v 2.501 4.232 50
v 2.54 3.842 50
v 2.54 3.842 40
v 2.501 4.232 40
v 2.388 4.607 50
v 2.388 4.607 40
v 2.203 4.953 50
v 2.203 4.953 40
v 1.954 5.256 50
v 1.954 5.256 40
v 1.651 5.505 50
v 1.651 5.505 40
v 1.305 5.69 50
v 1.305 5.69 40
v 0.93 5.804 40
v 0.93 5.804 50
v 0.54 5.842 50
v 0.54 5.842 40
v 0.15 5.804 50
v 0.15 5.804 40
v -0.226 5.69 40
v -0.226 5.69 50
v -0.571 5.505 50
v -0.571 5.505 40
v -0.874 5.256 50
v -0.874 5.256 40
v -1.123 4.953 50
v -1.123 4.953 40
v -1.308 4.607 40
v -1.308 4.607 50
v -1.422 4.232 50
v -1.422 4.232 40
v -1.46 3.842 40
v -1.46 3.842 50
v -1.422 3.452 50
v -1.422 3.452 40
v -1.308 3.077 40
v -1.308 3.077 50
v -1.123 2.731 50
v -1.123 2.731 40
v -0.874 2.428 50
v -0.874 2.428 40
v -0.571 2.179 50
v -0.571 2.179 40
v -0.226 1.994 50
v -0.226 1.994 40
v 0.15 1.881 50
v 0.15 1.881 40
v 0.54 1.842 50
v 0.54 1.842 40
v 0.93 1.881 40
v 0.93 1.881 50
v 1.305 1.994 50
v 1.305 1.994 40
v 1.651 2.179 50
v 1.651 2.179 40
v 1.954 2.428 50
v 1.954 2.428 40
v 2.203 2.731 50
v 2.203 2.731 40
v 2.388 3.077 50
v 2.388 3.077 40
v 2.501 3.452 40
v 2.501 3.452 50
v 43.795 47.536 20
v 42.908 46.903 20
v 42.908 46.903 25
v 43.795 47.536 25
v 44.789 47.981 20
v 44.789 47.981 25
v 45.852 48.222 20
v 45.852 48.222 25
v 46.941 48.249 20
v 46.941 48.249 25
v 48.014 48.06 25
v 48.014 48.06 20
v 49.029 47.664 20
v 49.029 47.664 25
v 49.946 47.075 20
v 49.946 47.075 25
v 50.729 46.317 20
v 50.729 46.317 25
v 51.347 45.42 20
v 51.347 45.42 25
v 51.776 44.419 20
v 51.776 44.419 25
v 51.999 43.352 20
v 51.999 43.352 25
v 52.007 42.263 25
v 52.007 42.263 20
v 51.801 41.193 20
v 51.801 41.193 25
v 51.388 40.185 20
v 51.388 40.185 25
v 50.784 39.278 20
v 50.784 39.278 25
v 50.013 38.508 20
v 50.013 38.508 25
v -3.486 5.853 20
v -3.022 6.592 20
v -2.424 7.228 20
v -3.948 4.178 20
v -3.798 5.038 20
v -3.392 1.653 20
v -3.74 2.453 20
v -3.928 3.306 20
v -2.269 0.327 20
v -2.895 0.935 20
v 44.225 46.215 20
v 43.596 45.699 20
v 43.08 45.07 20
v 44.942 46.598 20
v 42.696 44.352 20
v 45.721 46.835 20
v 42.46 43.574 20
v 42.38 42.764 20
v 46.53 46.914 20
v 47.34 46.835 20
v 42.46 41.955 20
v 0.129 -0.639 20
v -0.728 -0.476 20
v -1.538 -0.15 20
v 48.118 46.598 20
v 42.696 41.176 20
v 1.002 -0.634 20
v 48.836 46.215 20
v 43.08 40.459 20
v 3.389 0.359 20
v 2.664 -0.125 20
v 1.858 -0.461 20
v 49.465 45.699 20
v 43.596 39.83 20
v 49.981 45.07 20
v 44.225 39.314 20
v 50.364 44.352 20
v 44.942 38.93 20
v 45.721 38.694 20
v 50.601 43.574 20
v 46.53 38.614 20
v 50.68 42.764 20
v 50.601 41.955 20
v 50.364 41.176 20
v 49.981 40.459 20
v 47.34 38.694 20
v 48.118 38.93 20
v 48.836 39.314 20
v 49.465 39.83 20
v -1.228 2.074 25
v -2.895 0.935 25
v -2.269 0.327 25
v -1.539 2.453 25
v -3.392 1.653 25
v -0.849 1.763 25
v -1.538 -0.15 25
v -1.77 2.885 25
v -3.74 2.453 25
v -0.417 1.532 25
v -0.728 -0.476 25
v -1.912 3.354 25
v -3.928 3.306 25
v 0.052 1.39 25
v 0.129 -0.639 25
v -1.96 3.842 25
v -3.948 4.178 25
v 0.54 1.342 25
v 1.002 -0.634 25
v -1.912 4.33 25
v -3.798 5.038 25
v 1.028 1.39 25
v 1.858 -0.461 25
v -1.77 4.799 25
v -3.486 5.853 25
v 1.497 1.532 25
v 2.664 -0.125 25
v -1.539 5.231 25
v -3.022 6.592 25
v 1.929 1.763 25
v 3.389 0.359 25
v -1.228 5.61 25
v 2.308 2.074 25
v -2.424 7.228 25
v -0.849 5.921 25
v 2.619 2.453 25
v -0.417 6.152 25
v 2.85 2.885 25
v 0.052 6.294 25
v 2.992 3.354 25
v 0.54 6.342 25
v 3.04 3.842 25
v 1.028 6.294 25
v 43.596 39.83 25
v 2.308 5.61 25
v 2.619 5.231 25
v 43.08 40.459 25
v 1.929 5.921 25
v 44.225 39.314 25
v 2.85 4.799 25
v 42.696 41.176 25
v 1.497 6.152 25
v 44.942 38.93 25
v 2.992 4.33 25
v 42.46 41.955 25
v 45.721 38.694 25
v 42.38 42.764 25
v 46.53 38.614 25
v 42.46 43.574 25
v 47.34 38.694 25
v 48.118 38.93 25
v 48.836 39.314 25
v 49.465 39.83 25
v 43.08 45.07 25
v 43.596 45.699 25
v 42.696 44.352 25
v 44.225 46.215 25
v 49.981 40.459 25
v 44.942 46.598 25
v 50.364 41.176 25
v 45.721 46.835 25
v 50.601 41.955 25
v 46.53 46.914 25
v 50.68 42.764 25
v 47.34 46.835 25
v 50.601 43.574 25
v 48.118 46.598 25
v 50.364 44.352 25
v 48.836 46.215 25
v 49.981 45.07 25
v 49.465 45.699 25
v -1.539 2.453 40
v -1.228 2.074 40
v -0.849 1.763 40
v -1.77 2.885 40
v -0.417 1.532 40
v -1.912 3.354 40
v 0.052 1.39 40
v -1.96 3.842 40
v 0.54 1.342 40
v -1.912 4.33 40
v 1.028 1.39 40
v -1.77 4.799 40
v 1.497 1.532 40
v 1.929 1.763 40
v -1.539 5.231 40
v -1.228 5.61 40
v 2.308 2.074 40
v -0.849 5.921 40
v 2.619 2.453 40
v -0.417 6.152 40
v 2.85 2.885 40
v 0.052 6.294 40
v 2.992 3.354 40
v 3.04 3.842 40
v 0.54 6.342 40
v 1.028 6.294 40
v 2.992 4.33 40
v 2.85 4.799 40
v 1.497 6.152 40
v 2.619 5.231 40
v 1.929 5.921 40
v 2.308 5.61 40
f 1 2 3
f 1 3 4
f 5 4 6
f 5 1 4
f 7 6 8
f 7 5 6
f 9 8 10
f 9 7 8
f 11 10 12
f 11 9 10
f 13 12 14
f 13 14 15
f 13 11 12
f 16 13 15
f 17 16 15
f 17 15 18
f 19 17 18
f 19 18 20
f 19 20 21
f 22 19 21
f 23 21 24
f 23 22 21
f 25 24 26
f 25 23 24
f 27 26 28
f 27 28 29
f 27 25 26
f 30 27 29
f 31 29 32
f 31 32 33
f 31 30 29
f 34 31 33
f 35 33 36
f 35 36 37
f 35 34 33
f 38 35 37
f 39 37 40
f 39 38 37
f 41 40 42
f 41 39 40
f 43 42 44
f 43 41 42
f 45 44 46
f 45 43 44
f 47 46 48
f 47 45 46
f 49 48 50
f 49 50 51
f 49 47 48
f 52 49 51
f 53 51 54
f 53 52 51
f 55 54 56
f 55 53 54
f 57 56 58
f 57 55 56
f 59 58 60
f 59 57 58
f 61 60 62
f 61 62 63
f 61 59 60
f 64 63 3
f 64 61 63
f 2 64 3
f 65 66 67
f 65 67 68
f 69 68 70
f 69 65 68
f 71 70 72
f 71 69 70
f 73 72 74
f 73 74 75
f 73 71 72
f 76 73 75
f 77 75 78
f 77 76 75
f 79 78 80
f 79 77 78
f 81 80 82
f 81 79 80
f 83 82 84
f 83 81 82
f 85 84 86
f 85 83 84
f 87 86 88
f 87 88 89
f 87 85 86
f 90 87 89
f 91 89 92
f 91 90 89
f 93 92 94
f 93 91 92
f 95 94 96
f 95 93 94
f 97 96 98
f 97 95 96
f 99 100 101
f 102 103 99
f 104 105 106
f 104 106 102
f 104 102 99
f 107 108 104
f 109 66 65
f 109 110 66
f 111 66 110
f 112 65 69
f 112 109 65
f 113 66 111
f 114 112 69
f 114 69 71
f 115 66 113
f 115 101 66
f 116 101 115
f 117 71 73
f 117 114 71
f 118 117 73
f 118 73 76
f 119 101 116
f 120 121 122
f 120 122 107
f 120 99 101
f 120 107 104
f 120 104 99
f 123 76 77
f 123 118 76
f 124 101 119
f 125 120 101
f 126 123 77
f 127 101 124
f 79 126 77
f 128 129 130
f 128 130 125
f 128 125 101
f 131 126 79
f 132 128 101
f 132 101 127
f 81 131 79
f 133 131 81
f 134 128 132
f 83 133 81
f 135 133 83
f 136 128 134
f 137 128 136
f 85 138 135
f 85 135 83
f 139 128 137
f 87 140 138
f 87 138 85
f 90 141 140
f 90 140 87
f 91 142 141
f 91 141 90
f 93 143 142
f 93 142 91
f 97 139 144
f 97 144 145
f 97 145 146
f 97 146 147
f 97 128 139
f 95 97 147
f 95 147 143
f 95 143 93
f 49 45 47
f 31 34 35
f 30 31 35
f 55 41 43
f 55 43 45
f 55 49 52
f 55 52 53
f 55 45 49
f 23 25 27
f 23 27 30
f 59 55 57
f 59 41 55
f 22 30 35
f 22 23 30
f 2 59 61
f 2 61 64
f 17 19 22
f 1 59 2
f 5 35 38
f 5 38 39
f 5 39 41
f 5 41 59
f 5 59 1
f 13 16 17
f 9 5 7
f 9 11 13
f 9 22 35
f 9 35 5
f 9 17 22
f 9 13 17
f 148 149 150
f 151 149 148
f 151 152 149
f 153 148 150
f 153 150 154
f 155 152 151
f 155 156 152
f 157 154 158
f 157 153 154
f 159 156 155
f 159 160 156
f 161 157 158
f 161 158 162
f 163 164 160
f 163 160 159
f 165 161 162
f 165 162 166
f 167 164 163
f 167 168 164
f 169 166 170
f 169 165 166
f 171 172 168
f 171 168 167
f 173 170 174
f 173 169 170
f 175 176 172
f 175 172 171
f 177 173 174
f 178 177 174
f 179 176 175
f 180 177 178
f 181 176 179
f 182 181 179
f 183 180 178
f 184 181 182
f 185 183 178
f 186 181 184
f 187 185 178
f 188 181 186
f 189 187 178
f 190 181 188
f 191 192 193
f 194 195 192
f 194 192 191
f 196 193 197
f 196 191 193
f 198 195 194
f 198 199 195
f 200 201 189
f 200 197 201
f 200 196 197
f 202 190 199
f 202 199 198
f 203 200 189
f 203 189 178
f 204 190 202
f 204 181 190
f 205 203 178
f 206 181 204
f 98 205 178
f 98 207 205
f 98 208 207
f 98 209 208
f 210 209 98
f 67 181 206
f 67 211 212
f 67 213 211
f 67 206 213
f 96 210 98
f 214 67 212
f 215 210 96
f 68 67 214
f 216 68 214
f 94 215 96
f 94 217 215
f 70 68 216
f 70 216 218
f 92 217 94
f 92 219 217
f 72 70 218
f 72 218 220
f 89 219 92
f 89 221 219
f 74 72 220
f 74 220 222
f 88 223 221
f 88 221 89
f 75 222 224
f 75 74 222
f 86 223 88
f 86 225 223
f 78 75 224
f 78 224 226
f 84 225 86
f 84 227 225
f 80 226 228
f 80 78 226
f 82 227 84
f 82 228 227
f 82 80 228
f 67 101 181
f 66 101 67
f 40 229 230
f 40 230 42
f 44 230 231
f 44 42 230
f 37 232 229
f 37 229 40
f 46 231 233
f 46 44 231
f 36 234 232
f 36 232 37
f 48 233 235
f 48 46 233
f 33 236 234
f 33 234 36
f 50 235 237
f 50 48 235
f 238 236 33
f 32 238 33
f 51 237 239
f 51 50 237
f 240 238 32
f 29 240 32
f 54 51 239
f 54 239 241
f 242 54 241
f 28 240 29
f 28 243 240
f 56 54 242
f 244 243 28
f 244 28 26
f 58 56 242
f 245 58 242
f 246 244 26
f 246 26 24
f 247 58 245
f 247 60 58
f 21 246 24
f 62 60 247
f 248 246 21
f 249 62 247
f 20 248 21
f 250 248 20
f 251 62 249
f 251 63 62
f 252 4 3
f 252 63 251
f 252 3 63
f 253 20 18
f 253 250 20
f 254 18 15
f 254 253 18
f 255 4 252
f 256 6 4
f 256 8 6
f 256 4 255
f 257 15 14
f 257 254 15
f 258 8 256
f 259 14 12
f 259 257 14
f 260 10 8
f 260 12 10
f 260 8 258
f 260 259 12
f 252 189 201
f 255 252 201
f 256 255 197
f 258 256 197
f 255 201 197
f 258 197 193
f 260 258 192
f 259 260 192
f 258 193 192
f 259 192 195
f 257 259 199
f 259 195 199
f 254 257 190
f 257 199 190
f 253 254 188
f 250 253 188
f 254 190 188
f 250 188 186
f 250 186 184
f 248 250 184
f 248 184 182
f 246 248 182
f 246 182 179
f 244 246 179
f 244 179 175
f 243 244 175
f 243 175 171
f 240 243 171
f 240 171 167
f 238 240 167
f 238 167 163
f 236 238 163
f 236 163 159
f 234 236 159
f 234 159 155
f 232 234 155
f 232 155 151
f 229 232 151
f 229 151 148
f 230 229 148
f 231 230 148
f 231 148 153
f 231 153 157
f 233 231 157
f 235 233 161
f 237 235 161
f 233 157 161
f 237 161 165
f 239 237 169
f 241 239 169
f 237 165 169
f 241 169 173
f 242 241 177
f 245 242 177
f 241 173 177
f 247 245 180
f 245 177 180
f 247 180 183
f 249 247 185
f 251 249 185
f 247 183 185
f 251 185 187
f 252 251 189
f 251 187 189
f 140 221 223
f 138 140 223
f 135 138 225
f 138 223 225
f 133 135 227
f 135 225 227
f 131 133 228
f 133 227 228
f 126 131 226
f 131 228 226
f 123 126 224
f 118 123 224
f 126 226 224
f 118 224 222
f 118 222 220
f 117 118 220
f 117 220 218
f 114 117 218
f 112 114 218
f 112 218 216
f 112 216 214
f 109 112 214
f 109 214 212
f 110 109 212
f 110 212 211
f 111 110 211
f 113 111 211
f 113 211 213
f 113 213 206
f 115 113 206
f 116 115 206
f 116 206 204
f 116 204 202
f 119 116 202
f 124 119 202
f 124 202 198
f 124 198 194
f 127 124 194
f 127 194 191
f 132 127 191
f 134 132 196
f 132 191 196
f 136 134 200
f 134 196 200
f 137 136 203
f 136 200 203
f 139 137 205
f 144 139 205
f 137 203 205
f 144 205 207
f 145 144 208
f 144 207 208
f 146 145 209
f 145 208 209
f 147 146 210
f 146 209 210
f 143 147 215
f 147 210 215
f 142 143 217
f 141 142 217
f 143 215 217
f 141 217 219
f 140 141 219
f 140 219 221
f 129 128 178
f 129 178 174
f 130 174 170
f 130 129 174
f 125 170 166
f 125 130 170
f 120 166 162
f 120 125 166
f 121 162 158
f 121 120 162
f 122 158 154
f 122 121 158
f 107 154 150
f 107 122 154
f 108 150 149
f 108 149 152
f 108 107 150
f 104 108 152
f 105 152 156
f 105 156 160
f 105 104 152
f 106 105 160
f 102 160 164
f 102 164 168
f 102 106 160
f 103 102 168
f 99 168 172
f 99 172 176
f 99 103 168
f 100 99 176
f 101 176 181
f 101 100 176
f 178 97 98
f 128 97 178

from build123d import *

# Parameters (mm, degrees)
F0_W      = 140
F0_H      = 120
F1_DEPTH  = 25
F2_R      = 4.15
F3_DEPTH  = 25.001
F4_R      = 2.5
F5_DEPTH  = 25
F7_DEPTH  = 50.001
F9_DEPTH  = 20
F10_R     = 2.5
F10_R_2   = 2
F11_DEPTH = 10


with BuildPart() as f1:
    # F0 (on Top) → F1 (new body)
    with BuildSketch(Plane.XY):
        Rectangle(F0_W, F0_H)
    extrude(amount=F1_DEPTH)

    # F2 (on face) → F3 (cut, through all)
    with BuildSketch(Plane.XY.offset(25)):
        with Locations((46.530288, 42.764347)):
            Circle(F2_R)
    extrude(amount=-F3_DEPTH, mode=Mode.SUBTRACT)

    # F4 (on face) → F5 (join)
    with BuildSketch(Plane.XY.offset(25)):
        with Locations((0.539839, 3.842103)):
            Circle(F4_R)
    extrude(amount=F5_DEPTH)

    # F6 (on face) → F7 (intersect, through all)
    with BuildSketch(Plane(origin=(0, 0, 0), x_dir=(1, 0, 0), z_dir=(0, 0, -1))):
        with BuildLine():
            Line((-2.423829, -7.228351), (42.908028, -46.903095))
            ThreePointArc((42.908028, -46.903095), (50.728586, -46.317415), (50.013185, -38.507655))
            Line((50.013185, -38.507655), (3.389482, -0.359355))
            ThreePointArc((3.389482, -0.359355), (-2.895133, -0.935047), (-2.423829, -7.228351))
        make_face()
    extrude(amount=-F7_DEPTH, mode=Mode.INTERSECT)

    # F8 (on face) → F9 (cut)
    with BuildSketch(Plane(origin=(0, 0, 0), x_dir=(1, 0, 0), z_dir=(0, 0, -1))):
        with BuildLine():
            ThreePointArc((42.908028, -46.903095), (50.728586, -46.317415), (50.013185, -38.507655))
            Line((50.013185, -38.507655), (3.389482, -0.359355))
            ThreePointArc((3.389482, -0.359355), (-2.895133, -0.935047), (-2.423829, -7.228351))
            Line((-2.423829, -7.228351), (42.908028, -46.903095))
        make_face()
    extrude(amount=-F9_DEPTH, mode=Mode.SUBTRACT)

    # F10 (on face) → F11 (cut)
    with BuildSketch(Plane.XY.offset(50)):
        with Locations((0.539839, 3.842103)):
            Circle(F10_R)
        with Locations((0.539839, 3.842103)):
            Circle(F10_R_2, mode=Mode.SUBTRACT)
    extrude(amount=-F11_DEPTH, mode=Mode.SUBTRACT)


solid = f1.part
